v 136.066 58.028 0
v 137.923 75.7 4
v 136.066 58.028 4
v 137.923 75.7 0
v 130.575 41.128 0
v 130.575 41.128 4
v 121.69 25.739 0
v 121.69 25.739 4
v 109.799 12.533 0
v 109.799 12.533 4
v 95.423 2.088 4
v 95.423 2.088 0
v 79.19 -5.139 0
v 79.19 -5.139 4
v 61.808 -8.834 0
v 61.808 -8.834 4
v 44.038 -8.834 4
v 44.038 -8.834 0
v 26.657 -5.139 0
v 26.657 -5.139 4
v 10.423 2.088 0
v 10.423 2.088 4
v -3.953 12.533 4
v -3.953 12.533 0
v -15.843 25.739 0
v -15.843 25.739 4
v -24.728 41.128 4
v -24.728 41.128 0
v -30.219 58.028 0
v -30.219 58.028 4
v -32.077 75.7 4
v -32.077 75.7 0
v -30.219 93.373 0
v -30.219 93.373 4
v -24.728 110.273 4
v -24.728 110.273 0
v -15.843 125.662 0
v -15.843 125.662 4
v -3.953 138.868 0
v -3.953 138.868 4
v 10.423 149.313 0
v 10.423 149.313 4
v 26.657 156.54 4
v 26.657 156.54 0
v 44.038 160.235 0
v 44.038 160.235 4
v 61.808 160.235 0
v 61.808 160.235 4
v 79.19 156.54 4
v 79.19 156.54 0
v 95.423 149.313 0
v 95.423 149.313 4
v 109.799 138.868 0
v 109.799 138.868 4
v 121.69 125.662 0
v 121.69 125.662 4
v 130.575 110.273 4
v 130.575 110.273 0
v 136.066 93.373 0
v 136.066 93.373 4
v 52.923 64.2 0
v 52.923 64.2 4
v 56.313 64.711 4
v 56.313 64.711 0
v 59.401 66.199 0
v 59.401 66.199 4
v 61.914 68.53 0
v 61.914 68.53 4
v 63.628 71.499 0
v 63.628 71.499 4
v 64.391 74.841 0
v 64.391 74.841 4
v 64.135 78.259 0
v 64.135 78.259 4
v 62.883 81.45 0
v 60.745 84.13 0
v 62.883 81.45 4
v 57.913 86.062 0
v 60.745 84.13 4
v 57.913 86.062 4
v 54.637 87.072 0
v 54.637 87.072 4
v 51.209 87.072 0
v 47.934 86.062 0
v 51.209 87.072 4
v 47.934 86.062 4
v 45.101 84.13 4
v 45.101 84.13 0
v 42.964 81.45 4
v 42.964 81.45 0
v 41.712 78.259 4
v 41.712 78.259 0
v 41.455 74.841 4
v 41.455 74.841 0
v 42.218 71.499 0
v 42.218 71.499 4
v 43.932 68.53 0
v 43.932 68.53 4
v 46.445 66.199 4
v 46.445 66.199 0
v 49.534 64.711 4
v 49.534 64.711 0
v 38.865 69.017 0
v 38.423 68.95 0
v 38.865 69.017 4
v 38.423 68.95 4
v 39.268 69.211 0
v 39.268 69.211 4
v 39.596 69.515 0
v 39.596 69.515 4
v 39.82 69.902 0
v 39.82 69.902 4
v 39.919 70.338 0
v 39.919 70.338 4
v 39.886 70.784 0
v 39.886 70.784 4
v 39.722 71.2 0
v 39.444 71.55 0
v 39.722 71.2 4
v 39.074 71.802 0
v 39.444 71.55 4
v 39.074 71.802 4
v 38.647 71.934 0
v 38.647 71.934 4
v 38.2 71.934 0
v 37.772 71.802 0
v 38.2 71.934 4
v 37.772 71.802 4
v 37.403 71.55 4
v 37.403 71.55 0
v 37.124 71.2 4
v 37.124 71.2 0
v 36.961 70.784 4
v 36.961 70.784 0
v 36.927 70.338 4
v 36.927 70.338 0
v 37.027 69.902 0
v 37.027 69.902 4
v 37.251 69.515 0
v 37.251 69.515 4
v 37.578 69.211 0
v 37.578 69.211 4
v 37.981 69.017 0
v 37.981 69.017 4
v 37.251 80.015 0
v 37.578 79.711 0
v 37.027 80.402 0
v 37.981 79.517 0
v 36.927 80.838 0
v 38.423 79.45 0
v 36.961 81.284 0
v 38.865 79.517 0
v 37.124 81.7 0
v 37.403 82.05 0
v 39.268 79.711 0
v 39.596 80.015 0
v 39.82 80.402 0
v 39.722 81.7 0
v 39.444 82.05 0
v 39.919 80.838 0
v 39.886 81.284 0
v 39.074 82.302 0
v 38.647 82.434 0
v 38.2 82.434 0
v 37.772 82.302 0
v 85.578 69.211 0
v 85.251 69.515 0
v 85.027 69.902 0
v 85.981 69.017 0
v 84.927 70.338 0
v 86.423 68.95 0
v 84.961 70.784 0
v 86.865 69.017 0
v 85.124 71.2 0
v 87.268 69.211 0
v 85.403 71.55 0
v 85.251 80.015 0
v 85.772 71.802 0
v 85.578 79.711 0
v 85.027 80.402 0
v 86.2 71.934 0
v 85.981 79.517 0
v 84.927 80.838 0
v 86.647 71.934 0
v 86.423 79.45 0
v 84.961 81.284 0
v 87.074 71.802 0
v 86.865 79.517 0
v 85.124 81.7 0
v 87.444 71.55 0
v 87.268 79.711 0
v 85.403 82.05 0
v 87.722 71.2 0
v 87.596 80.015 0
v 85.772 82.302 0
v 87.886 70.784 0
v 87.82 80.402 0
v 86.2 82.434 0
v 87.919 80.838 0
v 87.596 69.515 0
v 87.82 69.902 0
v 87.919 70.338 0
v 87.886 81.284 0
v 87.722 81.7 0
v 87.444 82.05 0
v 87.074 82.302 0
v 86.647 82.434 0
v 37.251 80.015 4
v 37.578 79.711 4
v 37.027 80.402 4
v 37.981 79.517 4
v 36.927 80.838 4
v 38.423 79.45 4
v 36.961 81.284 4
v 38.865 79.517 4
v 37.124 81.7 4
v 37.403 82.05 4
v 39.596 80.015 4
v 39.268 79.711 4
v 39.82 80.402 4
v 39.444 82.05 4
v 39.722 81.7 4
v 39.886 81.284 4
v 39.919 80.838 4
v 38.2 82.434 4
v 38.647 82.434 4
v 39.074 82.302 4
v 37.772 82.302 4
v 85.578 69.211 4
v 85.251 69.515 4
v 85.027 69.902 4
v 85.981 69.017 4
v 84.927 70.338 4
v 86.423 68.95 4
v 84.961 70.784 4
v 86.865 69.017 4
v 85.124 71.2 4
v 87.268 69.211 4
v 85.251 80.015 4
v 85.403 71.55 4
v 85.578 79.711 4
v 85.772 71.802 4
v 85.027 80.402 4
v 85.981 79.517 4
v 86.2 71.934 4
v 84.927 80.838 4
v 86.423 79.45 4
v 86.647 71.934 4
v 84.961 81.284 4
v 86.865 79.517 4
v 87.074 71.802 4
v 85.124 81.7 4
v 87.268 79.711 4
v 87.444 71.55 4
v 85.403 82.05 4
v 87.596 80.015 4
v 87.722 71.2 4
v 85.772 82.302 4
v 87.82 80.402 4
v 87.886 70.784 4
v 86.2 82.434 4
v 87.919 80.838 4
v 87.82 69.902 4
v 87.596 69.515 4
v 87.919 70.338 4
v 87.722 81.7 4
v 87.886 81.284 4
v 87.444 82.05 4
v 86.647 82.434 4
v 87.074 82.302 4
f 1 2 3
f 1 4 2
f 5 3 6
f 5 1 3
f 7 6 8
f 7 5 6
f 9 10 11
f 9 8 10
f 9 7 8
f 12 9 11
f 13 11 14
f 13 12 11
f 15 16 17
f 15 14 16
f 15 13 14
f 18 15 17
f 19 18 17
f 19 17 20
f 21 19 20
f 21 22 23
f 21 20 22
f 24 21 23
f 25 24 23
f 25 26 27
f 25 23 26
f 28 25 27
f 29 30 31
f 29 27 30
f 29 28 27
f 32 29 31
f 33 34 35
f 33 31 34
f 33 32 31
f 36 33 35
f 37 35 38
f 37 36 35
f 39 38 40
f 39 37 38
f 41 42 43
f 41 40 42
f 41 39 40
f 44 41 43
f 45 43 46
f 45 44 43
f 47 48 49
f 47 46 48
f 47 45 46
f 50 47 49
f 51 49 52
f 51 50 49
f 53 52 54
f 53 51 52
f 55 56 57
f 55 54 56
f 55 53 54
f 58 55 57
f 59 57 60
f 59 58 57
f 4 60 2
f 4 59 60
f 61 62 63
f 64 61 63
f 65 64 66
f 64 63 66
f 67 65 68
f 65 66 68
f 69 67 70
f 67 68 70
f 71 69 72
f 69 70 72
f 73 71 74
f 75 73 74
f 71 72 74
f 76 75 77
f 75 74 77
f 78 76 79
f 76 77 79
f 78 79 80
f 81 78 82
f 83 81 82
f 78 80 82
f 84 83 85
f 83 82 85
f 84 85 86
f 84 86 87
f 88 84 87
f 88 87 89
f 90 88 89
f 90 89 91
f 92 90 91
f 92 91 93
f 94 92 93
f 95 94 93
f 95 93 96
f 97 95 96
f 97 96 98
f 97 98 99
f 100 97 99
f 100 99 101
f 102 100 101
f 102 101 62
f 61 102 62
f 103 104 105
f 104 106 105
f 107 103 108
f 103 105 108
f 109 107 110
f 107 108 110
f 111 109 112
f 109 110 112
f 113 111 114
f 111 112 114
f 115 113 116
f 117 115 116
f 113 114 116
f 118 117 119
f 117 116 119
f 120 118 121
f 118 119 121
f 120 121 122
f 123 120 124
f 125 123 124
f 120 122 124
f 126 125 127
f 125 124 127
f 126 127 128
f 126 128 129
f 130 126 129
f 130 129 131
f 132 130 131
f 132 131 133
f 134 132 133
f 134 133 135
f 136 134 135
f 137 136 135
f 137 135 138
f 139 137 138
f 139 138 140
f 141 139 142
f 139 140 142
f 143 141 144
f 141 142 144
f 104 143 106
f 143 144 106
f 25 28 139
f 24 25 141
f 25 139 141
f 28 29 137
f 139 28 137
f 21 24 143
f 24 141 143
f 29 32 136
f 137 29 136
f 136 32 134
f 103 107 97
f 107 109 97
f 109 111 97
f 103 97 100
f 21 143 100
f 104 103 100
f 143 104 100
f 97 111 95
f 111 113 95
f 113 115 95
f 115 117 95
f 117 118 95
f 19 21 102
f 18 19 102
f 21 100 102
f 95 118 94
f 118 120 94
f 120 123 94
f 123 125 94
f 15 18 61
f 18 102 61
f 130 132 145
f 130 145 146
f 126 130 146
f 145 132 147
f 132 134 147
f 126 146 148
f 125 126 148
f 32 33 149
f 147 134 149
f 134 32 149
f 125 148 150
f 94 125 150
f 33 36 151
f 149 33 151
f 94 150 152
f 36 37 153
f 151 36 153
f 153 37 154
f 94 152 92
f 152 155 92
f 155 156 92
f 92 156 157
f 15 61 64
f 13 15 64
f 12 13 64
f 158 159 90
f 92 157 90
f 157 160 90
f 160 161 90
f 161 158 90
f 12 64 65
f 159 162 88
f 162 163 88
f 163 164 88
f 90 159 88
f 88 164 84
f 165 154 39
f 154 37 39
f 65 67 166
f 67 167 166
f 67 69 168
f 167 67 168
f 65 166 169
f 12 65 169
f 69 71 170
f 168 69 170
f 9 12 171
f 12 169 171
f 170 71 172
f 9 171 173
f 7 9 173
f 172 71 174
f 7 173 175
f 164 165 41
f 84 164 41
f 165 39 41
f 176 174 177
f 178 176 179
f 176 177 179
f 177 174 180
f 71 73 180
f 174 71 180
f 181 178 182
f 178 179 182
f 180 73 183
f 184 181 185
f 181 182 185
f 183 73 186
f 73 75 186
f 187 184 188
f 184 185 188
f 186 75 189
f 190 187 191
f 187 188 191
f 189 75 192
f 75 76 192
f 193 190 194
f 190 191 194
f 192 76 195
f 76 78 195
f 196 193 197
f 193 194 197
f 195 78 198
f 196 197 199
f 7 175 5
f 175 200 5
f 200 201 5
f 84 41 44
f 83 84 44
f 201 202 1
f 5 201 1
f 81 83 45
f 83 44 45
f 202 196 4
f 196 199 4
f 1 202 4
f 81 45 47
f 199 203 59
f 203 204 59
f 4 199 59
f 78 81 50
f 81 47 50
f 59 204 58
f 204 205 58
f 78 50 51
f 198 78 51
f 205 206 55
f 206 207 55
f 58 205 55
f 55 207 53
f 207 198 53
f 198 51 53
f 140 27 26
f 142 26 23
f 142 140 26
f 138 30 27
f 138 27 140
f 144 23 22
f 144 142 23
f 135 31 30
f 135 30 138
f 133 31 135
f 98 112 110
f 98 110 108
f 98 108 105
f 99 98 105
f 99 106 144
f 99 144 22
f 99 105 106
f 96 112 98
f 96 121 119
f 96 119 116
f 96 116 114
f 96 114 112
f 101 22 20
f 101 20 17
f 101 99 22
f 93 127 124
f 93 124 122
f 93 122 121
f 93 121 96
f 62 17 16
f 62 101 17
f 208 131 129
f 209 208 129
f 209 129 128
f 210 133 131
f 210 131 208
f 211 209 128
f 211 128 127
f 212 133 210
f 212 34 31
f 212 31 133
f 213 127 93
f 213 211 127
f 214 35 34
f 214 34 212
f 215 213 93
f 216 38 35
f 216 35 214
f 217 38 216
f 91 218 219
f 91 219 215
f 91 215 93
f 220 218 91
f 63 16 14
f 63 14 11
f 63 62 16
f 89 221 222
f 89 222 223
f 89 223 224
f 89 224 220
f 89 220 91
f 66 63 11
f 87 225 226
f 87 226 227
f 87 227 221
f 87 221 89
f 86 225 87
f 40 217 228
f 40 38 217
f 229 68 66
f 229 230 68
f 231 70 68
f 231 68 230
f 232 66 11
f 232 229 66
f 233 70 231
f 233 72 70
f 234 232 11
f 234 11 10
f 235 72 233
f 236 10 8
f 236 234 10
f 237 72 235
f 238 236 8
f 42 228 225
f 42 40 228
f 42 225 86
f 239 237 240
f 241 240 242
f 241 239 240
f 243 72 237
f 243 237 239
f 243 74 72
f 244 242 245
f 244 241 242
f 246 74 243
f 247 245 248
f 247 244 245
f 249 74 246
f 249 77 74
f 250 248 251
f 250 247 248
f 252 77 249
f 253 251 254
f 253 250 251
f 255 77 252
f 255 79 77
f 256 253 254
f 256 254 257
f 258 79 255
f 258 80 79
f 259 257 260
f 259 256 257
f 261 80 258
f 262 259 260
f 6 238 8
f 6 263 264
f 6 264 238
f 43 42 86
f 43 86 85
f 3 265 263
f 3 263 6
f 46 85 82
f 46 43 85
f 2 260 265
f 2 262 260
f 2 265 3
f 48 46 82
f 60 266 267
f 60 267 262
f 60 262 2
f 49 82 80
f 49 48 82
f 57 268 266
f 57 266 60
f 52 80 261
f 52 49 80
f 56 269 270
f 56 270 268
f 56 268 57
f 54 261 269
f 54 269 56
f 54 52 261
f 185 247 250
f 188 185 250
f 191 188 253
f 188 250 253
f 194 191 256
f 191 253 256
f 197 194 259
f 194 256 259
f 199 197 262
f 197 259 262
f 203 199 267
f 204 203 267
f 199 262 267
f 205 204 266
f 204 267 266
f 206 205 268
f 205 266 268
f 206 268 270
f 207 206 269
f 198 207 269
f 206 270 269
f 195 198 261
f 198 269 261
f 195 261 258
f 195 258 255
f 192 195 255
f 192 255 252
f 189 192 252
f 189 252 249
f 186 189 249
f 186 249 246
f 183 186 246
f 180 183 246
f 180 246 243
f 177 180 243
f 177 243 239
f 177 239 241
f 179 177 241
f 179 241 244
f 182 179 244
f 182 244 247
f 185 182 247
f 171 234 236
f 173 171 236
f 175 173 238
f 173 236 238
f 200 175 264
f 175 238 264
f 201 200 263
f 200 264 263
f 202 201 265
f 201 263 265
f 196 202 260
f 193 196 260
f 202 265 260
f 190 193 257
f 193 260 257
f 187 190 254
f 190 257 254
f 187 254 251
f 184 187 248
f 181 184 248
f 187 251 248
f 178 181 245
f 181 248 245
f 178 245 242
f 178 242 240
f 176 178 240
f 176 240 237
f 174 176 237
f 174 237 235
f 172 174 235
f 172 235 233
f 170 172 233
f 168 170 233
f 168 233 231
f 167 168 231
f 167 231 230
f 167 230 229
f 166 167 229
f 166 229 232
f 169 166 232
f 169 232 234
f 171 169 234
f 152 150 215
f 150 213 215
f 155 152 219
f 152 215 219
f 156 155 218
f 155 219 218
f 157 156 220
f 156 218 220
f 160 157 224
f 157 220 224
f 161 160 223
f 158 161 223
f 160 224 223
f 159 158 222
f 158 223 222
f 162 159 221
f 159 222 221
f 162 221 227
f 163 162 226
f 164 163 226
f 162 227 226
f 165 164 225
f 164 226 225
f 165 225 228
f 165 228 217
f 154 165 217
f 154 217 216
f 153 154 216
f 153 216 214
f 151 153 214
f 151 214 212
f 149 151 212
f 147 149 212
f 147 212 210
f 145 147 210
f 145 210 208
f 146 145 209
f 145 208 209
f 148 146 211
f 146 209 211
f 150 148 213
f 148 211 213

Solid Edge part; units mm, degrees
sketch "Sketch1" plane through (0, 0, 0) normal (0, 0, 1) x (1, 0, 0)
  circle A0 centre (52.9233, 75.7004) radius 85
extrude "Protrusion1" add sketch "Sketch1" along normal blind 4
hole "Furo_1" at (52.9233, 75.7004, 4) direction (0, 0, -1) diameter 10 end up to next
hole "Furo_2" at (52.9233, 75.7004, 4) direction (0, 0, -1) diameter 23 end up to next
hole "Furo_3" at (38.4233, 80.9504, 4) direction (0, 0, -1) diameter 3 end up to next
hole "Hole1" at (38.4233, 70.4504, 4) direction (0, 0, -1) diameter 3 end up to next
hole "Furo_5" at (86.4233, 80.9504, 4) direction (0, 0, -1) diameter 3 end up to next
hole "Hole2" at (86.4233, 70.4504, 4) direction (0, 0, -1) diameter 3 end up to next
